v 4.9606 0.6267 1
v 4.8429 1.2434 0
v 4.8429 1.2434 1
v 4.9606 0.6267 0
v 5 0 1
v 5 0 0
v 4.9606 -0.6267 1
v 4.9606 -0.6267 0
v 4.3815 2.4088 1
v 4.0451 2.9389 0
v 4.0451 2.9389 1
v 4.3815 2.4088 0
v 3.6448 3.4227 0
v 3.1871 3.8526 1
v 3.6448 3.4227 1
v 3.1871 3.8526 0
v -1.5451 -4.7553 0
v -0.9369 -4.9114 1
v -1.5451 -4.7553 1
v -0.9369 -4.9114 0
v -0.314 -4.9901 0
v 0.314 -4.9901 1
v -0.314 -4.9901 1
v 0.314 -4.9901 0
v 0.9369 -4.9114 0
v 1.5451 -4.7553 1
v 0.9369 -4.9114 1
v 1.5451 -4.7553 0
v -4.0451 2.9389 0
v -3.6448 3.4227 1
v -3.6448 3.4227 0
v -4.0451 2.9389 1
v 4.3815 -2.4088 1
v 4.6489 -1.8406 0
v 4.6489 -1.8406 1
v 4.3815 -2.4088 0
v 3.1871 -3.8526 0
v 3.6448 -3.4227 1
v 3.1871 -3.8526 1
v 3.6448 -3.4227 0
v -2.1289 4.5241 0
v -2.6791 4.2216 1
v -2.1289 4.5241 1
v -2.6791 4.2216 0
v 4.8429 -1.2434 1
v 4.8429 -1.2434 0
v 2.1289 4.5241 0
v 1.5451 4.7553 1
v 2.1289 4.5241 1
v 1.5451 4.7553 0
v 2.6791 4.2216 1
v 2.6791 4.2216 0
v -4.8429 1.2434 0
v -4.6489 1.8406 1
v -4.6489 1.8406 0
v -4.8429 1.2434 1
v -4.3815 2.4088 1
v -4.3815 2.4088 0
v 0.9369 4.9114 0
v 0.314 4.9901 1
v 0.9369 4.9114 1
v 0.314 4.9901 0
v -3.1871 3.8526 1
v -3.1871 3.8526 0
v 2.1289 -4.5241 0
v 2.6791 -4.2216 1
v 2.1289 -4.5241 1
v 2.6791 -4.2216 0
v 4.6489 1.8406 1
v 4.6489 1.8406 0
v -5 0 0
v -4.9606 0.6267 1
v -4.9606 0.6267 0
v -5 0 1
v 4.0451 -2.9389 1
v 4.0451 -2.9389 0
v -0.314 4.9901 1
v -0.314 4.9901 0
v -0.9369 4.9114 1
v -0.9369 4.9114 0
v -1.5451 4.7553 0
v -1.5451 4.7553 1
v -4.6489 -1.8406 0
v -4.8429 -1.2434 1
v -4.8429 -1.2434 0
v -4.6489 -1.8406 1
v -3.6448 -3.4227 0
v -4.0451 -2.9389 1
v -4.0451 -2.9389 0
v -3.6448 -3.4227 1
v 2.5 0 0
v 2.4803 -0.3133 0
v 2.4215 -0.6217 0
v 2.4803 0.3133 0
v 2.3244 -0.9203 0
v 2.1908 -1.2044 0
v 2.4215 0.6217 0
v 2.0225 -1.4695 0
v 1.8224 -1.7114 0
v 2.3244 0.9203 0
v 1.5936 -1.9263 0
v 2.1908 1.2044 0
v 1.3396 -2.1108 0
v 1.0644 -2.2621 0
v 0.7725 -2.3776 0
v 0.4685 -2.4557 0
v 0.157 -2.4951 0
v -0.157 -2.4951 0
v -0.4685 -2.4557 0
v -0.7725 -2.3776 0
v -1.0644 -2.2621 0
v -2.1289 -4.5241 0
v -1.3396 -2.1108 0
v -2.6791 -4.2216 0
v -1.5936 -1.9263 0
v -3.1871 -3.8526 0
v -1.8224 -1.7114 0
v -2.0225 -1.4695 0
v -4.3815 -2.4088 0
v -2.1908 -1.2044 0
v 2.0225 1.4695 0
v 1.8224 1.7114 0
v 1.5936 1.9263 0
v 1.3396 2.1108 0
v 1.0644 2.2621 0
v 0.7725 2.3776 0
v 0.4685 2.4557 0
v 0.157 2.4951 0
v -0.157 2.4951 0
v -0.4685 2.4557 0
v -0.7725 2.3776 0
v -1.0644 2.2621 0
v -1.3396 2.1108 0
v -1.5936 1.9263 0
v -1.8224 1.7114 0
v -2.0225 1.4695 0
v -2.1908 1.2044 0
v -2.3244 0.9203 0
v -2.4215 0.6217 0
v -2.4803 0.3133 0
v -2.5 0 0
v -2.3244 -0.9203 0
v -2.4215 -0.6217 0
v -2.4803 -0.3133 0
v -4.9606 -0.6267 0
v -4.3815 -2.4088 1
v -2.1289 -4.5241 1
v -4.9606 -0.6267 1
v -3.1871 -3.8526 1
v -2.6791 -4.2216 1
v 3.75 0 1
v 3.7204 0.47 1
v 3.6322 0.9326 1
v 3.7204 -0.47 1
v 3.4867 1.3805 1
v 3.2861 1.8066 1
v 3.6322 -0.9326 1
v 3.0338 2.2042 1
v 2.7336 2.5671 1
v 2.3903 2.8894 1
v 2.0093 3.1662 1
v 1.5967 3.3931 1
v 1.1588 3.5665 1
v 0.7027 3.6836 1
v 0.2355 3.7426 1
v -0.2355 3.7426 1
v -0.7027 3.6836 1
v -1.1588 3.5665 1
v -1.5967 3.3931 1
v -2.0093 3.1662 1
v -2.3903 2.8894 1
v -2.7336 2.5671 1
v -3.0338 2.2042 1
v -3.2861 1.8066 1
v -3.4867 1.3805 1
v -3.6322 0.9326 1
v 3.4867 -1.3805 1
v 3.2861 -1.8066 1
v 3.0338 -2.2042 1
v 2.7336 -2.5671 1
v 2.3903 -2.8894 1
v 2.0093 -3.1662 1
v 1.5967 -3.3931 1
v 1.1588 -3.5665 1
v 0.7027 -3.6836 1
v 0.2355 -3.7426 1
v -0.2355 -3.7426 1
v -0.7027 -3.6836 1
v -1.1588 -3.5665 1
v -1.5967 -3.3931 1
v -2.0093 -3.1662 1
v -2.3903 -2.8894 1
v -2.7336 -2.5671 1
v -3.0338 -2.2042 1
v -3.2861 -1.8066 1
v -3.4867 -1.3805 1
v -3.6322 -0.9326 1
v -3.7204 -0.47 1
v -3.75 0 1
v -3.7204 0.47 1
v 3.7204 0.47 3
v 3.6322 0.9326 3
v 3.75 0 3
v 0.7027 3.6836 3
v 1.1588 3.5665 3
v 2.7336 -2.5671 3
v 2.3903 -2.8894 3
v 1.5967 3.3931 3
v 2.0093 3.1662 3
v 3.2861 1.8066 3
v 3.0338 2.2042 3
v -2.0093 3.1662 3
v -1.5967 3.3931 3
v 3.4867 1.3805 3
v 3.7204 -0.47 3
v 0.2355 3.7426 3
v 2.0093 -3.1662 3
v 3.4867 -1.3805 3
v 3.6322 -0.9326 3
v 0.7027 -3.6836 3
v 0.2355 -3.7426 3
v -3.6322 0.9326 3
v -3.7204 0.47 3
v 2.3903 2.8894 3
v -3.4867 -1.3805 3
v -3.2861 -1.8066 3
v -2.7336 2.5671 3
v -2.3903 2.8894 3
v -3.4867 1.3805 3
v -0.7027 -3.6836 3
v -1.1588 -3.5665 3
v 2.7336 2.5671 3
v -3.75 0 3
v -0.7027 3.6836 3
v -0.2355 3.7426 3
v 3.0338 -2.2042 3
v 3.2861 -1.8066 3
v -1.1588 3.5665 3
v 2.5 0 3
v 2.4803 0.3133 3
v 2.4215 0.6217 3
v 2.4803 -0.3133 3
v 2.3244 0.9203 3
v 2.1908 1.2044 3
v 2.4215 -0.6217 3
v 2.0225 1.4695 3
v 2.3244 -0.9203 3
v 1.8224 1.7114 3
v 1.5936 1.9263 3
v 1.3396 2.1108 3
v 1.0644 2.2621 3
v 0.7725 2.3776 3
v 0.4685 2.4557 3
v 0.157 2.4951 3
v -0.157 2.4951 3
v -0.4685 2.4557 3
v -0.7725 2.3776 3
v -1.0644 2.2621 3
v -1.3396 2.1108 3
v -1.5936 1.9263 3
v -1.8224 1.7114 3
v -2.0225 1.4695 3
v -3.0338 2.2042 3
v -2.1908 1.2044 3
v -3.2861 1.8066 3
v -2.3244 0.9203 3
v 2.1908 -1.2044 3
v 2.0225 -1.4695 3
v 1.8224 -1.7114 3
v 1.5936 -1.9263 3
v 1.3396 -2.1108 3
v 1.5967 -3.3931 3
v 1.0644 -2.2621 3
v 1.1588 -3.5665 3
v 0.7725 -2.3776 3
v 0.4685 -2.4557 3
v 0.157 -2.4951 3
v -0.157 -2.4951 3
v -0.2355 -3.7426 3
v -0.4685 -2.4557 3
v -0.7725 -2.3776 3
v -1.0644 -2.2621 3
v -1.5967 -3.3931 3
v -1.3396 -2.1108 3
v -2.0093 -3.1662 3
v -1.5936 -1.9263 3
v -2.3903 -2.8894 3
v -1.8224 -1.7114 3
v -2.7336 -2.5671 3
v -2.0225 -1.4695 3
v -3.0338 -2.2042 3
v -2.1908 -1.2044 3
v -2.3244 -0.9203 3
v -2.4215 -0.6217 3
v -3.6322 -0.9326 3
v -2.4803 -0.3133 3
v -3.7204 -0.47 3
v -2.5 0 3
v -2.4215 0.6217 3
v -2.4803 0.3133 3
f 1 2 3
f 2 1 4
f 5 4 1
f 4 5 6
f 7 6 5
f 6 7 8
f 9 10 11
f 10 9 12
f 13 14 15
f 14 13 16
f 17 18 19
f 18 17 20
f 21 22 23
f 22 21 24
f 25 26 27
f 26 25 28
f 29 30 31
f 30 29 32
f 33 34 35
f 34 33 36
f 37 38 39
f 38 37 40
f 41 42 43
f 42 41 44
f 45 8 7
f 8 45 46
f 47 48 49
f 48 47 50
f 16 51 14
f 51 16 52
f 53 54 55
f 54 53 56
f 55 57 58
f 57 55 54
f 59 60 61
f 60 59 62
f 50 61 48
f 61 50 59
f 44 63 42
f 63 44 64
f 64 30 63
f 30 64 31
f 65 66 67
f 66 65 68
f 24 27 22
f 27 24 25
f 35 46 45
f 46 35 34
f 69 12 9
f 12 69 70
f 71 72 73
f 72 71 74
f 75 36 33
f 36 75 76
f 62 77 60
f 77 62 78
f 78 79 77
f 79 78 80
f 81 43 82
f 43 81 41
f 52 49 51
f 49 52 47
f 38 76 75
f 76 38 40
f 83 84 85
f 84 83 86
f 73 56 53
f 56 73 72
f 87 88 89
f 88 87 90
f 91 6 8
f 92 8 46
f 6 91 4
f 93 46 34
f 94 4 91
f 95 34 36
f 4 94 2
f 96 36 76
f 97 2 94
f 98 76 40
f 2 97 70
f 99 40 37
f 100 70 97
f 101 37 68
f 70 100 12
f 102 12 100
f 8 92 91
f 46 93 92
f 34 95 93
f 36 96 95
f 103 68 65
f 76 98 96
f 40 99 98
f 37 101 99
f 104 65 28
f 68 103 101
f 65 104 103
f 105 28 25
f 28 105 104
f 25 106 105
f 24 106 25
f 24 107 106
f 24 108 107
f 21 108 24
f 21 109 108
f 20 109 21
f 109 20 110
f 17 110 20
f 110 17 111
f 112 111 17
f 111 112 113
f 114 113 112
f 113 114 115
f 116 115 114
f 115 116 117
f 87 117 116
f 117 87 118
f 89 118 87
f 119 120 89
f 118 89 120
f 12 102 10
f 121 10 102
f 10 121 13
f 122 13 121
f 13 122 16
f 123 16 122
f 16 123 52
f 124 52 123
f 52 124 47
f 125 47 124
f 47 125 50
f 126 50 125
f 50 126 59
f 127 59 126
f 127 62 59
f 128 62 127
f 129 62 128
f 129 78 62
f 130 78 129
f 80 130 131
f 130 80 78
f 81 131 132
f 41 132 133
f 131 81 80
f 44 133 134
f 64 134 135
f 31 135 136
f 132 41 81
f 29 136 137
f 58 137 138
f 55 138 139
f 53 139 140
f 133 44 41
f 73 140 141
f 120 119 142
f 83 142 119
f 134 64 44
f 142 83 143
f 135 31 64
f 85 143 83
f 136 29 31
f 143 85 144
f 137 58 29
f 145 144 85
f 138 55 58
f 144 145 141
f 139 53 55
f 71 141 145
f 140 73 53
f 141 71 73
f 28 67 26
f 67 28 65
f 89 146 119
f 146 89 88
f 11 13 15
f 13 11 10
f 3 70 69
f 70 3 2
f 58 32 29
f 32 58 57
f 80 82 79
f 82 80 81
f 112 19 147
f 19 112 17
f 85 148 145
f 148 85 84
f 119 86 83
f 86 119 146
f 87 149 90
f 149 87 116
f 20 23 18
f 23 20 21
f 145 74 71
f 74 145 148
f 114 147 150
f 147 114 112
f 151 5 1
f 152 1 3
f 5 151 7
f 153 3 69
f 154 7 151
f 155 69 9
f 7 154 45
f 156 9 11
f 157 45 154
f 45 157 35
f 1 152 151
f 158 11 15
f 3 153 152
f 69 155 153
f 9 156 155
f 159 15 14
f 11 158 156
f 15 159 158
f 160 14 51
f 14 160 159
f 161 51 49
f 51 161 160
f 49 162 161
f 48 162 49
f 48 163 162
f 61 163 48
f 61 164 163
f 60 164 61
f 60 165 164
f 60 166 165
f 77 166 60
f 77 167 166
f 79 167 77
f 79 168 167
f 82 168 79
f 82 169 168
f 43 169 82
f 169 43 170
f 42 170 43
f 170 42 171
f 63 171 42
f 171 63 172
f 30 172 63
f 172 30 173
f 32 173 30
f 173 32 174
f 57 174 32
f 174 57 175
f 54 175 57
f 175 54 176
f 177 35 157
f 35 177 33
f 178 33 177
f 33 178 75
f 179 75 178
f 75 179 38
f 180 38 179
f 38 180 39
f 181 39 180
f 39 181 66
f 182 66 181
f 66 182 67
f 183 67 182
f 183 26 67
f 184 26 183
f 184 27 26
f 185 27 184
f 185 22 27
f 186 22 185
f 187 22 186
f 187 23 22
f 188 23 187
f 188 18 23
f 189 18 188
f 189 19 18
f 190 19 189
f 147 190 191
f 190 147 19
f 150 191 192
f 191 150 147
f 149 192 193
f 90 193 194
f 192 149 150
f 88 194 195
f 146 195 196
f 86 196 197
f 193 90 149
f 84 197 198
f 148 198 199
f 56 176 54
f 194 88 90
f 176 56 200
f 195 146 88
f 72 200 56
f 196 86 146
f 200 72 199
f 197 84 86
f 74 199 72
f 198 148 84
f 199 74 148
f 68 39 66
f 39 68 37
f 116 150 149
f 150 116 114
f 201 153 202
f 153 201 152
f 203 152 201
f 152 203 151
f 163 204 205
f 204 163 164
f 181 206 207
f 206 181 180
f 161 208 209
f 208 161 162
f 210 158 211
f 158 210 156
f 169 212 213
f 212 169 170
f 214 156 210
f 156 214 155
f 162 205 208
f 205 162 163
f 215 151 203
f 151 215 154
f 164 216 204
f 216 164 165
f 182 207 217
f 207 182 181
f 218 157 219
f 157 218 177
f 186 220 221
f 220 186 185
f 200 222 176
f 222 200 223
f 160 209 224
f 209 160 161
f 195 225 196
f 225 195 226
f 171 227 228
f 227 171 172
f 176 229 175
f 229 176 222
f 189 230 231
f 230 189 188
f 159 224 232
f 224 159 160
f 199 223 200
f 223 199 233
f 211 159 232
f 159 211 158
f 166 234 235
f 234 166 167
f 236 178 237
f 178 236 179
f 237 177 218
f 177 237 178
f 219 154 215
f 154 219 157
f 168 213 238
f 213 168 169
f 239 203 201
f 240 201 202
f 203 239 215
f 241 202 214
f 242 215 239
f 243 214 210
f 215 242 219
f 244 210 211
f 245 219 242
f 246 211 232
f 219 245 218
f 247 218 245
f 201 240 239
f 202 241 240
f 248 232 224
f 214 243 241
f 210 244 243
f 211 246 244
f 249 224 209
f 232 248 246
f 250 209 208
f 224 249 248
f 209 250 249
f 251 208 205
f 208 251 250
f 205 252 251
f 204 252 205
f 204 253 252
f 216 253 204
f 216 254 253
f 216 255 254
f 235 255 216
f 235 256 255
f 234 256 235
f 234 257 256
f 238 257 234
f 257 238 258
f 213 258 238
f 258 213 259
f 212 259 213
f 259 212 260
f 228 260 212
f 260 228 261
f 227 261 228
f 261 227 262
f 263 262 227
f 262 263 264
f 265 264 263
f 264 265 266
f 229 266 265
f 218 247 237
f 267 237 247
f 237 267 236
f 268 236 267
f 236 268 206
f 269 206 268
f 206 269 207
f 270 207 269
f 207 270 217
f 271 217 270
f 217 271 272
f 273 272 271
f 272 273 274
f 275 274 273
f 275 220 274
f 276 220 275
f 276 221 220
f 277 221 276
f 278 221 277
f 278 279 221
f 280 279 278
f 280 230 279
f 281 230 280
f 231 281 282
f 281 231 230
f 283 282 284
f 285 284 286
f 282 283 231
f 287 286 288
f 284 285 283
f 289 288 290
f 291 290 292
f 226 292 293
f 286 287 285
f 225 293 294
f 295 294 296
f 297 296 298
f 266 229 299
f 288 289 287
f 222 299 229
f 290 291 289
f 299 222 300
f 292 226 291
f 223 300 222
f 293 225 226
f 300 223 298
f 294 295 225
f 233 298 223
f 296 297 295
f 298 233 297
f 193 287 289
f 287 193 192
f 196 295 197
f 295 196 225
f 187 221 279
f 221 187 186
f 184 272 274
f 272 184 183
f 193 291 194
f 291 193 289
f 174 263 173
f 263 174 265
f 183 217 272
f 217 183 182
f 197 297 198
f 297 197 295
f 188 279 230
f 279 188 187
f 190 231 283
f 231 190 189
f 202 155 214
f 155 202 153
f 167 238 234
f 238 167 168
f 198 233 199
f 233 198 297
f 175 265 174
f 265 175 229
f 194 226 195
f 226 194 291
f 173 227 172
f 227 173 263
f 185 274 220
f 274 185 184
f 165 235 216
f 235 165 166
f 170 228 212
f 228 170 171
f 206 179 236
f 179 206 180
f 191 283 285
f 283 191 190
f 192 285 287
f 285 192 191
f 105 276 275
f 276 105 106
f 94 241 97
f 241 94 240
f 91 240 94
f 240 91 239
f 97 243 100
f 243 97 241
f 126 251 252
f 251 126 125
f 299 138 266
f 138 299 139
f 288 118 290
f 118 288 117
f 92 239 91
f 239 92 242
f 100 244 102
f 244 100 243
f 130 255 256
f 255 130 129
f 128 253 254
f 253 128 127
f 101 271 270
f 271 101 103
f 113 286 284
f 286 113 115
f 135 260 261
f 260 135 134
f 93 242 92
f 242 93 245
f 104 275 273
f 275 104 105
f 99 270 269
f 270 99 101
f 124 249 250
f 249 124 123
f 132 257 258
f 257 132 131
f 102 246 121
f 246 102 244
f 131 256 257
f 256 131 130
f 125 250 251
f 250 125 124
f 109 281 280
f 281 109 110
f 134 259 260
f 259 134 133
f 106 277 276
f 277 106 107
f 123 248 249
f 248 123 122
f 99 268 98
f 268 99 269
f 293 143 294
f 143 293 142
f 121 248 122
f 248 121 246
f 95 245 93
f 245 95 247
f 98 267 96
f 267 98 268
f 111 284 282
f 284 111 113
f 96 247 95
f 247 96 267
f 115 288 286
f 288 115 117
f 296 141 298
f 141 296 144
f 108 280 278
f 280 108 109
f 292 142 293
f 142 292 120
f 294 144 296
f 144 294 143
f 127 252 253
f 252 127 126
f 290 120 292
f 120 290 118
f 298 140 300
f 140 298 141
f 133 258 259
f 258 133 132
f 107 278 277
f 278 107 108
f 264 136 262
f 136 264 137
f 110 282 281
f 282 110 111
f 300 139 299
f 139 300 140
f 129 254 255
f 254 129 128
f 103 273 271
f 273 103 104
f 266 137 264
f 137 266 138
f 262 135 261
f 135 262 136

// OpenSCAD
// [FL_INDEX: keywords="openscad, 3d_parametric, Spring_Seat, csg_solid" | COT="Parametric OpenSCAD design from 3DCodeverse"]
// Title: Spring Seat

/*************************************************************************** 
Spring seat to maintain spring alignment and even pressure when compressed.
Author: Mike Thompson (thingyverse: mike_linus)
Date Last Modified: 16/03/2013
Description: change the variable values to print an inside or outside seat of the required dimensions.  The inside seat is more compact for tighter spaces.  The outside version hides the base of the spring for but looks chunkier.
****************************************************************************/

/*globals*/
resolution=50;
bolt_hole_radius=2.5;
seat_radius=5;
support_height=3;
//"inside" or "outside"
seat_type="inside";
thickness=1;

$fn=resolution;

module base(){
	cylinder(r=seat_radius,h=thickness);
	cylinder(r=seat_radius-thickness-0.25,h=support_height);
}

if (seat_type=="inside"){
	difference(){
		base();
		cylinder(r=bolt_hole_radius,h=support_height);
	}
}
else {
	difference(){
		cylinder(r=seat_radius+thickness,h=support_height);
		translate([0,0,thickness])cylinder(r=seat_radius,h=support_height);
		cylinder(r=bolt_hole_radius,h=support_height);
	}
}
